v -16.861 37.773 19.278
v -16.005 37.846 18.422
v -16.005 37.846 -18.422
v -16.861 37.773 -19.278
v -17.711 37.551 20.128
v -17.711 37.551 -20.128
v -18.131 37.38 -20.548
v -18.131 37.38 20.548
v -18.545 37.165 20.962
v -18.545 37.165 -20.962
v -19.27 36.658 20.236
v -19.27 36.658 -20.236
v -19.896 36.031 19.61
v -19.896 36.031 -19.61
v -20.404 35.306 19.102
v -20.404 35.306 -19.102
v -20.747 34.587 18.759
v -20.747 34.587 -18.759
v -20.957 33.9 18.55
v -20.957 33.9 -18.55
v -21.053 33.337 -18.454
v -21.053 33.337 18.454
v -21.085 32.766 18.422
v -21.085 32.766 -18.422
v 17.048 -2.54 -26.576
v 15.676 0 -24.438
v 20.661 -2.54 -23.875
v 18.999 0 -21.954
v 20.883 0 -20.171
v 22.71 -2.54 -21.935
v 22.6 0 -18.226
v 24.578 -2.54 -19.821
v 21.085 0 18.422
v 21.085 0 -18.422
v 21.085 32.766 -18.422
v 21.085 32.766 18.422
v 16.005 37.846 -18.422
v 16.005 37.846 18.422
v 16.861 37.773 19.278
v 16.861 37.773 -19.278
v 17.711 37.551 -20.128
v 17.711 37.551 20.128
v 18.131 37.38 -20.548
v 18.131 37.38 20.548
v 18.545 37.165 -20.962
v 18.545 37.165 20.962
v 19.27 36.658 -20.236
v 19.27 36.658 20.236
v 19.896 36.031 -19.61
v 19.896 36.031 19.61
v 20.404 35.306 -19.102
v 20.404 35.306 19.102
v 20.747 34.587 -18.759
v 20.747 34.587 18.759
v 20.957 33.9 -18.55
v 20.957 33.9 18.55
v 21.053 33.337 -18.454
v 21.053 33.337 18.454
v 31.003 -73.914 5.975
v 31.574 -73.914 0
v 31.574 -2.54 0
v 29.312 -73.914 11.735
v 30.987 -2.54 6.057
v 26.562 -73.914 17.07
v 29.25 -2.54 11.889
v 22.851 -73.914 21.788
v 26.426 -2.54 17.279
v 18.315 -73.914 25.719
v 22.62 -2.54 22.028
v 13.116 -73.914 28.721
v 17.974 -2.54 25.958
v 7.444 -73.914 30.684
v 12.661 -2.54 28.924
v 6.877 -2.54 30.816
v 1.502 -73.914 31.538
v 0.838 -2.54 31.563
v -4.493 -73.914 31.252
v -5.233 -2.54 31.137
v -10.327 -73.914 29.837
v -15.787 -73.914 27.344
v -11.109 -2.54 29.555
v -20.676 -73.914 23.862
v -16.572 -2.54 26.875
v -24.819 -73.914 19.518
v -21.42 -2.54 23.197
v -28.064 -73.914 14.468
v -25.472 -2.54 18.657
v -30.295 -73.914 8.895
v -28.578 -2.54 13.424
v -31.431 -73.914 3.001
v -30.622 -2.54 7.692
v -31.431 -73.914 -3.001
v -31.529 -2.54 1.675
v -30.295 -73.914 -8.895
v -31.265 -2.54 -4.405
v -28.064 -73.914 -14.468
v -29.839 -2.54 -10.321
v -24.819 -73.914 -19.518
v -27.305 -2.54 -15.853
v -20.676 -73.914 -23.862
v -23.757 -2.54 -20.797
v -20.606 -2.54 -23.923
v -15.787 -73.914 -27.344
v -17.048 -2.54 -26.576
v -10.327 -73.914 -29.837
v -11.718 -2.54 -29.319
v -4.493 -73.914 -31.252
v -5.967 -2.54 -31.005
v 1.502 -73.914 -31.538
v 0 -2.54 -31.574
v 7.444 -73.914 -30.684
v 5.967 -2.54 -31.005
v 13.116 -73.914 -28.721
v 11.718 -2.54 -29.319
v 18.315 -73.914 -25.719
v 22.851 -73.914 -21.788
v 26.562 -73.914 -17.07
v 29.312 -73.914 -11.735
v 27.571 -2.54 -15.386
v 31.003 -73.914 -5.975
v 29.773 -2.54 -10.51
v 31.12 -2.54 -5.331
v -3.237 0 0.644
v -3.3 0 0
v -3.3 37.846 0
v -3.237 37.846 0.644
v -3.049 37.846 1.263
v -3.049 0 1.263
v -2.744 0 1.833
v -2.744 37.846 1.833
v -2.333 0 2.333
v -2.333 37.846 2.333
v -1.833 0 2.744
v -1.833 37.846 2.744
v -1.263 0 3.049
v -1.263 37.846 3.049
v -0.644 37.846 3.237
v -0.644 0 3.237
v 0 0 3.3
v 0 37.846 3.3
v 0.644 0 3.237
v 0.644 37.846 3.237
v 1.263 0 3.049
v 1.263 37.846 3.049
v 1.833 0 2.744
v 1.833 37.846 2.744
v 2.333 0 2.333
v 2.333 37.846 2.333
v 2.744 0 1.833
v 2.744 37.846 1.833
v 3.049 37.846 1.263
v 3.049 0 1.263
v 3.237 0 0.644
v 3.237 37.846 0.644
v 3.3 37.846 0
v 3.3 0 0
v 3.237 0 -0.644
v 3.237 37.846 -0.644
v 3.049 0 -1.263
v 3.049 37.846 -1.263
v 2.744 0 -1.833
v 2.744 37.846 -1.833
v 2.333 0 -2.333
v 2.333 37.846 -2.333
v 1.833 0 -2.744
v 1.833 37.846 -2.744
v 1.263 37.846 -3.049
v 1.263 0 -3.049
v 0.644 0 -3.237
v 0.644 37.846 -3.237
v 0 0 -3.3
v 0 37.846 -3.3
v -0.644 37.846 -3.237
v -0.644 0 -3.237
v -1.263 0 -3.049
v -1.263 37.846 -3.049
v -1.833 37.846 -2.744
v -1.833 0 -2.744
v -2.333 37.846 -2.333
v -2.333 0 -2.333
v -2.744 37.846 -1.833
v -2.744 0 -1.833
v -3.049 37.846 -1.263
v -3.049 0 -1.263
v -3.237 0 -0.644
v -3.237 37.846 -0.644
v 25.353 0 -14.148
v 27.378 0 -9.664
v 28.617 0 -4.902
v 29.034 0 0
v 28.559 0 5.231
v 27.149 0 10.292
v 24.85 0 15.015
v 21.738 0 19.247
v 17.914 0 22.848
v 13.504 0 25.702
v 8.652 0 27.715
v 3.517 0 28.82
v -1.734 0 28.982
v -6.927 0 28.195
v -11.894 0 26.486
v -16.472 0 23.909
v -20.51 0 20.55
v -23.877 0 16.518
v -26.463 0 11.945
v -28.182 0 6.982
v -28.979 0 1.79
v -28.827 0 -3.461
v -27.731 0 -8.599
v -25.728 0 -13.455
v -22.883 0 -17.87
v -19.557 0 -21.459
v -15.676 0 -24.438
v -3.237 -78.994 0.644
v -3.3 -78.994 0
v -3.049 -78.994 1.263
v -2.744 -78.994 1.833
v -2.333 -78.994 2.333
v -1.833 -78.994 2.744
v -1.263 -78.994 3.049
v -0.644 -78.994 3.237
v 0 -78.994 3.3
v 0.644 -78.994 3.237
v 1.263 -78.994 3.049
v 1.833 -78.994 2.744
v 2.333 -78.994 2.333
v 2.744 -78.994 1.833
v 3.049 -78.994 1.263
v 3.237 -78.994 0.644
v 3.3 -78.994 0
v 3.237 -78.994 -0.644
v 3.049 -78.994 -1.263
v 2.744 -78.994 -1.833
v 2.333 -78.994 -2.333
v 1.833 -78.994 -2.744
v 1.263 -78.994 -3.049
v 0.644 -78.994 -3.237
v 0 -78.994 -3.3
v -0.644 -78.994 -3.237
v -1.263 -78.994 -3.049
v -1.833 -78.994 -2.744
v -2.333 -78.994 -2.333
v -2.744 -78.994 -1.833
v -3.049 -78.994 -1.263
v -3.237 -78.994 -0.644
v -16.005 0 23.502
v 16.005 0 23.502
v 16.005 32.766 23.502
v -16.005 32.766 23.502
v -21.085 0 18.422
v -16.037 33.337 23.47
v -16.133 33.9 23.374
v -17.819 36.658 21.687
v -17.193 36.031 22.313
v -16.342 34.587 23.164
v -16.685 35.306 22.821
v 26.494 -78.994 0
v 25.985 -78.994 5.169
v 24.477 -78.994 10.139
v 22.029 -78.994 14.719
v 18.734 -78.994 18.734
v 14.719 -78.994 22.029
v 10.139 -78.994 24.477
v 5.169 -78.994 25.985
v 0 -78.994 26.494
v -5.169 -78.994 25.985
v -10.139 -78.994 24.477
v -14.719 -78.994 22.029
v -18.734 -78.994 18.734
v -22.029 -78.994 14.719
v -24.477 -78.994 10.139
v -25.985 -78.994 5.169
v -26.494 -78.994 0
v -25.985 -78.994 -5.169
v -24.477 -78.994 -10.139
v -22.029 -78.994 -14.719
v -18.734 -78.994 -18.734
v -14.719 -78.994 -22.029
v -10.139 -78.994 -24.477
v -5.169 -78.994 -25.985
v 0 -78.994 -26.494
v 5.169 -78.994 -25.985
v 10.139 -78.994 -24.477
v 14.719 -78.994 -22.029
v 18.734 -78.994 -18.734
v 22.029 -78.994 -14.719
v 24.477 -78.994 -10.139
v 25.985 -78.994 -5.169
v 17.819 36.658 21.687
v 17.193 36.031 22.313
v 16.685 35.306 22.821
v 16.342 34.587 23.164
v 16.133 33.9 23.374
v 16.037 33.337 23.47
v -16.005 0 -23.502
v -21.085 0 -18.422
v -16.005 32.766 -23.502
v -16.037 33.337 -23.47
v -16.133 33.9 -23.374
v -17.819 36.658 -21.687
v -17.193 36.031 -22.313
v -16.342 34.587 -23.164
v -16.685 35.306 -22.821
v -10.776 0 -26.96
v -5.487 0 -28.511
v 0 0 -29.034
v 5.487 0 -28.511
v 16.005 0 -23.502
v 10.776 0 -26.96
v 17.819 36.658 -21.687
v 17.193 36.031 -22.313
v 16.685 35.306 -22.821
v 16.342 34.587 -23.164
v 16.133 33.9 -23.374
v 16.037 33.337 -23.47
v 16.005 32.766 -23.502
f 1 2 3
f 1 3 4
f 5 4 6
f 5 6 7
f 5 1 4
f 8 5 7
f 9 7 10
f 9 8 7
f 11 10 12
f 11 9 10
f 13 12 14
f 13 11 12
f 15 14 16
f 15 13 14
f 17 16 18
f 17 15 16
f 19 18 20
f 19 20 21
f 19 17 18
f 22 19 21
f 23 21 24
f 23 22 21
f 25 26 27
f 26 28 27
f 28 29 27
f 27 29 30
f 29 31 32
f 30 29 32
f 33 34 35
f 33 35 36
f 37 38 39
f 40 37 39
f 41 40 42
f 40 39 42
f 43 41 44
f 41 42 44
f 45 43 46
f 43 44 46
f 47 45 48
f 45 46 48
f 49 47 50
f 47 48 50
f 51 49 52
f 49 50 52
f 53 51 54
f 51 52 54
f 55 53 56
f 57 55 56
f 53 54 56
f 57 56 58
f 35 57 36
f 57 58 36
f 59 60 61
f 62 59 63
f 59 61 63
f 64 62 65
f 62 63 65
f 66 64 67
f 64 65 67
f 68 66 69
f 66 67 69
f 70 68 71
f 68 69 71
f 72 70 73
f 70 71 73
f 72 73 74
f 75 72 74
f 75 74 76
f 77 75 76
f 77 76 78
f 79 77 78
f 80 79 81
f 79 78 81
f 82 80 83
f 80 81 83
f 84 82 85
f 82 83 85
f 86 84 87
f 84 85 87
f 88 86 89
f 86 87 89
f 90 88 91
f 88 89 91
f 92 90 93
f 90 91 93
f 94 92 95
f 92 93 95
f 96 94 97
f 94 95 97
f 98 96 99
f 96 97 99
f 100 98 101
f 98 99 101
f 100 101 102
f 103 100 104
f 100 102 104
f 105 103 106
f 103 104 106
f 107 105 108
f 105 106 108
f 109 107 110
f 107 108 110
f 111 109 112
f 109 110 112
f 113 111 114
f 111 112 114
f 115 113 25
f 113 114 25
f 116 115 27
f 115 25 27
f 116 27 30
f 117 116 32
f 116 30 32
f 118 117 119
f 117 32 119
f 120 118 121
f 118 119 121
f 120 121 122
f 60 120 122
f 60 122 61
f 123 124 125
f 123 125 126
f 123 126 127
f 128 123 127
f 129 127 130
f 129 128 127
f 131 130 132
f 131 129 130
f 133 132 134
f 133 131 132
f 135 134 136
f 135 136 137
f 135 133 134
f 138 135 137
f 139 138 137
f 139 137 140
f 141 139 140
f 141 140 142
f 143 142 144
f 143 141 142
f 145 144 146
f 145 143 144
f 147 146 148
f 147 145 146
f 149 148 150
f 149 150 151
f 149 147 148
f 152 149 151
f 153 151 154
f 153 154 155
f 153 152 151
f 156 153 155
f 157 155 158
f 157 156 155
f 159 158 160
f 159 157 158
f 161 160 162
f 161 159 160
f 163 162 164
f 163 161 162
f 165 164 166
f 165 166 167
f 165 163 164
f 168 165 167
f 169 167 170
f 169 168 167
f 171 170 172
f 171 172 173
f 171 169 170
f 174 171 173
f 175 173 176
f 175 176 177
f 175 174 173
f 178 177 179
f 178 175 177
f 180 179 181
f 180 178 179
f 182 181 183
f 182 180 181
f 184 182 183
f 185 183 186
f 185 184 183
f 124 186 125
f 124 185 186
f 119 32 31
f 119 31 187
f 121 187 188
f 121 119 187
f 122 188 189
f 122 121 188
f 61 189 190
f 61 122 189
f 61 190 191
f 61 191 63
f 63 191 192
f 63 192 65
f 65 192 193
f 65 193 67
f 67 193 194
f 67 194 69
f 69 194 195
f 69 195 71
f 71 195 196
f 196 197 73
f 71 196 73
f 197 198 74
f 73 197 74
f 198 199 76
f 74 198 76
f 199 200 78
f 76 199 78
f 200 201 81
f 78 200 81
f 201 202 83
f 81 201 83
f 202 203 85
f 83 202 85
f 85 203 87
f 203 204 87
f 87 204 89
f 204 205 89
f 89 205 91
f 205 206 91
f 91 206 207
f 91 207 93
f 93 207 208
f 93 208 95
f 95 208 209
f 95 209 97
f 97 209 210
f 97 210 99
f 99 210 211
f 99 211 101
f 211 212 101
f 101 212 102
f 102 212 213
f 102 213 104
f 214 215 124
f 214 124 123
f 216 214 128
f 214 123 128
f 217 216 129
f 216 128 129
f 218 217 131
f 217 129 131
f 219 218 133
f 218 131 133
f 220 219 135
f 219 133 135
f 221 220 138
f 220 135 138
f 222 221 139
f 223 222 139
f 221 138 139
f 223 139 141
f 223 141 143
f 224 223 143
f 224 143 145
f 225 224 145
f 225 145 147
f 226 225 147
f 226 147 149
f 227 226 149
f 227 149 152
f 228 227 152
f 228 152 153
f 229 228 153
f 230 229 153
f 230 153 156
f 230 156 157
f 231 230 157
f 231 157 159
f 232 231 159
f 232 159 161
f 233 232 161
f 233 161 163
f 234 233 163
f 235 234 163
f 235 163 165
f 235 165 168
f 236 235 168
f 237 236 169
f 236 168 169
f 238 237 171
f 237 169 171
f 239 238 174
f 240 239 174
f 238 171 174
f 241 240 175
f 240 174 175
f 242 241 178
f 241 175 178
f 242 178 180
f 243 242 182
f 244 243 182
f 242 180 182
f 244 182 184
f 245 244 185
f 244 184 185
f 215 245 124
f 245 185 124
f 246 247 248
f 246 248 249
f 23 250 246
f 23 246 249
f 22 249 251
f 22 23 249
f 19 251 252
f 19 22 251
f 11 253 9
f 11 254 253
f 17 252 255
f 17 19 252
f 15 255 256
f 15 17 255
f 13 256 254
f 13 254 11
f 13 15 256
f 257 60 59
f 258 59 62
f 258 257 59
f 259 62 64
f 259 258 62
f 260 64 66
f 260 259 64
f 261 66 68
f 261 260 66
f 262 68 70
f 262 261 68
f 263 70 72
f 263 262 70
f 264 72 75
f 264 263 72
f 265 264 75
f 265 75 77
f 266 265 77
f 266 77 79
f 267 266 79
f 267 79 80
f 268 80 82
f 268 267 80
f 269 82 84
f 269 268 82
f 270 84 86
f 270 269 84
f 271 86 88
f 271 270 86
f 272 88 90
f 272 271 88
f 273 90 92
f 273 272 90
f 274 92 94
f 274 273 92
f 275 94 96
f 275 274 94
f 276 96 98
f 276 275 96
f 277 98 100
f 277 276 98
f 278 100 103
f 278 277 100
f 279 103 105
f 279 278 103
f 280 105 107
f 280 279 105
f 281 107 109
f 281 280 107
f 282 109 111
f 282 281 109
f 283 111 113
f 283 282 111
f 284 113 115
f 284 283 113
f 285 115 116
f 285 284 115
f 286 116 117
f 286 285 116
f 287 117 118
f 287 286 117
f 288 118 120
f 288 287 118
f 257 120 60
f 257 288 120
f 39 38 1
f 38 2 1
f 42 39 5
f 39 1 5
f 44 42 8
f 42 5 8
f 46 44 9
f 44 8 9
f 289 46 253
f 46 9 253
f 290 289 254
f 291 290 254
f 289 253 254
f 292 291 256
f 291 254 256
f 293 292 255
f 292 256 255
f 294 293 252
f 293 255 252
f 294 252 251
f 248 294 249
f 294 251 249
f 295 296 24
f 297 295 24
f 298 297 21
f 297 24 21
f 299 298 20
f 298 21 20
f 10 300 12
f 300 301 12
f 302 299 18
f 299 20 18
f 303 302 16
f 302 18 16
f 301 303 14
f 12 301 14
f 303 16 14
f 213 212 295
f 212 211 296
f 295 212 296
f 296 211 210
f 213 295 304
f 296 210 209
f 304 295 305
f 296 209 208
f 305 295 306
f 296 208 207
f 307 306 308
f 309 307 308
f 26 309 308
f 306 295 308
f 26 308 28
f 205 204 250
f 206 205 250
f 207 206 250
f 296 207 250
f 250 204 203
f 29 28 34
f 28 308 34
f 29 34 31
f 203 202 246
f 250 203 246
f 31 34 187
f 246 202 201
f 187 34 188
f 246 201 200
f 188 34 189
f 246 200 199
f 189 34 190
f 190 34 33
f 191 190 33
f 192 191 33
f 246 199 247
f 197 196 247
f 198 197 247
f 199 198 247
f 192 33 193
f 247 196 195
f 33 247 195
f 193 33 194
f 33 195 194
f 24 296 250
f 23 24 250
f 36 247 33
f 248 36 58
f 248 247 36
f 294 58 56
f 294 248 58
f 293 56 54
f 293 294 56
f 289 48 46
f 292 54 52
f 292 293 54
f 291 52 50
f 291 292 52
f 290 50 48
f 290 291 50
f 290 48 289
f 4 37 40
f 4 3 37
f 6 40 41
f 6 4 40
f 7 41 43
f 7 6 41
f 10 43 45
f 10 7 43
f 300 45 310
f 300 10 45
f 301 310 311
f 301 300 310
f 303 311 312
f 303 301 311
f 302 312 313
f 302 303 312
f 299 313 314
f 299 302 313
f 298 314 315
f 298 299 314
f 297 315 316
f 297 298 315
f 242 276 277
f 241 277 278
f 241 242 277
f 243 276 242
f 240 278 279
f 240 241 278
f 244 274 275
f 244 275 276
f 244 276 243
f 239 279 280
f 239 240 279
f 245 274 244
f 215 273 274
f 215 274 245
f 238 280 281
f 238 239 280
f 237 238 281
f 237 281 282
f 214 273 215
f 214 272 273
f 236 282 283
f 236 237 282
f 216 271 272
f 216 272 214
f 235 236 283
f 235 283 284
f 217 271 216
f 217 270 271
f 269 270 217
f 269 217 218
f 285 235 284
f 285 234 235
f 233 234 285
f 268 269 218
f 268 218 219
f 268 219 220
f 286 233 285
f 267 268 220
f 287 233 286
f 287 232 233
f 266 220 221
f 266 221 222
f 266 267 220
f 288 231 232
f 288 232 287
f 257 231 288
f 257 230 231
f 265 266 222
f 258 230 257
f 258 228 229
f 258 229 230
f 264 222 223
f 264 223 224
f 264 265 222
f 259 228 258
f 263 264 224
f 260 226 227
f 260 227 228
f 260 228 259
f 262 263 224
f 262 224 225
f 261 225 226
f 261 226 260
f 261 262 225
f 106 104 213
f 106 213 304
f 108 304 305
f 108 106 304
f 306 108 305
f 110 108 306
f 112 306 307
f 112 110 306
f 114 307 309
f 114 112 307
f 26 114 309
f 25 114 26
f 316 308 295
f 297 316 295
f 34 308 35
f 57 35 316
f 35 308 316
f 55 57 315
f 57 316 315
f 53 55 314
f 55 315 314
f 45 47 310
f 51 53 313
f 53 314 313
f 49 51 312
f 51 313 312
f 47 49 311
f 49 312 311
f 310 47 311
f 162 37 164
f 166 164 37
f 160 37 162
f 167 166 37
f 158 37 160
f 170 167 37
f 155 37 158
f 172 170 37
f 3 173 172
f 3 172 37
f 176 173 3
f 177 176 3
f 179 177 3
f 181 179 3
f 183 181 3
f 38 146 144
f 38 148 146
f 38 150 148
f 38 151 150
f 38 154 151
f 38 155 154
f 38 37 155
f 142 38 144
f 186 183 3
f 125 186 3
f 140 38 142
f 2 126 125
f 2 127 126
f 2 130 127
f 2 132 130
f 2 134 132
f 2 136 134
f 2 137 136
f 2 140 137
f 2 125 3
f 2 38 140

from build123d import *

# Parameters (mm, degrees)
F0_R     = 31.5738283612
F1_DEPTH = 78.994
F3_D     = 6.6
F5_W     = 42.1696881435
F5_H     = 47.0036589152
F5_R     = 3.3
F6_DEPTH = 37.846
F7_SIZE2 = 5.08
F7_SIZE  = 5.08
F8_F1_R  = 5.08
F8_F2_R  = 5.08
F8_F3_R  = 5.0799
F8_F4_R  = 5.0799
F9_SIZE  = 2.54
F10_SIZE = 5.08


# Not quite as in the source:
# - a fillet or chamfer is up to 0.001 mm smaller than in the source, because OpenCascade refuses the exact size


with BuildPart() as f1:
    # F0 (on Front) → F1 (new body)
    with BuildSketch(Plane.XZ):
        Circle(F0_R)
    extrude(amount=F1_DEPTH)

    # F3 (through all)
    with Locations(Plane.XZ.offset(78.994)):
        with Locations((0, 0)):
            Hole(F3_D / 2)

    # F5 (on face) → F6 (join)
    with BuildSketch(Plane(origin=(0, 0, 0), x_dir=(-1, 0, 0), z_dir=(0, 1, 0))):
        Rectangle(F5_W, F5_H)
        Circle(F5_R, mode=Mode.SUBTRACT)
    extrude(amount=F6_DEPTH)

    # F7
    f7_edges = [f1.edges().sort_by_distance(p)[0] for p in [
        (21.084844, 18.923, 23.501829),
        (21.084844, 18.923, -23.501829),
        (-21.084844, 18.923, 23.501829),
        (-21.084844, 18.923, -23.501829),
    ]]
    chamfer(f7_edges, length=F7_SIZE, length2=F7_SIZE2)

    # F8: fillet of radius 5.08 on 4 edges, made by hand

    # F8_f1
    f8_f1_edges = [f1.edges().sort_by_distance(p)[0] for p in [
        (-21.0848440718, 37.846, 0),
    ]]
    fillet(f8_f1_edges, radius=F8_F1_R)

    # F8_f2
    f8_f2_edges = [f1.edges().sort_by_distance(p)[0] for p in [
        (21.0848440718, 37.846, 0),
    ]]
    fillet(f8_f2_edges, radius=F8_F2_R)

    # F8_f3 (radius 5.08 in the source; OpenCascade refuses exactly that, so slightly less here)
    f8_f3_edges = [f1.edges().sort_by_distance(p)[0] for p in [
        (0, 37.846, -23.5018294576),
    ]]
    fillet(f8_f3_edges, radius=F8_F3_R)

    # F8_f4 (radius 5.08 in the source; OpenCascade refuses exactly that, so slightly less here)
    f8_f4_edges = [f1.edges().sort_by_distance(p)[0] for p in [
        (0, 37.846, 23.5018294576),
    ]]
    fillet(f8_f4_edges, radius=F8_F4_R)

    # F9
    f9_edges = [f1.edges().sort_by_distance(p)[0] for p in [
        (-31.573828, 0, 0),
    ]]
    chamfer(f9_edges, length=F9_SIZE)

    # F10
    f10_edges = [f1.edges().sort_by_distance(p)[0] for p in [
        (-31.573828, -78.994, 0),
    ]]
    chamfer(f10_edges, length=F10_SIZE)


solid = f1.part
